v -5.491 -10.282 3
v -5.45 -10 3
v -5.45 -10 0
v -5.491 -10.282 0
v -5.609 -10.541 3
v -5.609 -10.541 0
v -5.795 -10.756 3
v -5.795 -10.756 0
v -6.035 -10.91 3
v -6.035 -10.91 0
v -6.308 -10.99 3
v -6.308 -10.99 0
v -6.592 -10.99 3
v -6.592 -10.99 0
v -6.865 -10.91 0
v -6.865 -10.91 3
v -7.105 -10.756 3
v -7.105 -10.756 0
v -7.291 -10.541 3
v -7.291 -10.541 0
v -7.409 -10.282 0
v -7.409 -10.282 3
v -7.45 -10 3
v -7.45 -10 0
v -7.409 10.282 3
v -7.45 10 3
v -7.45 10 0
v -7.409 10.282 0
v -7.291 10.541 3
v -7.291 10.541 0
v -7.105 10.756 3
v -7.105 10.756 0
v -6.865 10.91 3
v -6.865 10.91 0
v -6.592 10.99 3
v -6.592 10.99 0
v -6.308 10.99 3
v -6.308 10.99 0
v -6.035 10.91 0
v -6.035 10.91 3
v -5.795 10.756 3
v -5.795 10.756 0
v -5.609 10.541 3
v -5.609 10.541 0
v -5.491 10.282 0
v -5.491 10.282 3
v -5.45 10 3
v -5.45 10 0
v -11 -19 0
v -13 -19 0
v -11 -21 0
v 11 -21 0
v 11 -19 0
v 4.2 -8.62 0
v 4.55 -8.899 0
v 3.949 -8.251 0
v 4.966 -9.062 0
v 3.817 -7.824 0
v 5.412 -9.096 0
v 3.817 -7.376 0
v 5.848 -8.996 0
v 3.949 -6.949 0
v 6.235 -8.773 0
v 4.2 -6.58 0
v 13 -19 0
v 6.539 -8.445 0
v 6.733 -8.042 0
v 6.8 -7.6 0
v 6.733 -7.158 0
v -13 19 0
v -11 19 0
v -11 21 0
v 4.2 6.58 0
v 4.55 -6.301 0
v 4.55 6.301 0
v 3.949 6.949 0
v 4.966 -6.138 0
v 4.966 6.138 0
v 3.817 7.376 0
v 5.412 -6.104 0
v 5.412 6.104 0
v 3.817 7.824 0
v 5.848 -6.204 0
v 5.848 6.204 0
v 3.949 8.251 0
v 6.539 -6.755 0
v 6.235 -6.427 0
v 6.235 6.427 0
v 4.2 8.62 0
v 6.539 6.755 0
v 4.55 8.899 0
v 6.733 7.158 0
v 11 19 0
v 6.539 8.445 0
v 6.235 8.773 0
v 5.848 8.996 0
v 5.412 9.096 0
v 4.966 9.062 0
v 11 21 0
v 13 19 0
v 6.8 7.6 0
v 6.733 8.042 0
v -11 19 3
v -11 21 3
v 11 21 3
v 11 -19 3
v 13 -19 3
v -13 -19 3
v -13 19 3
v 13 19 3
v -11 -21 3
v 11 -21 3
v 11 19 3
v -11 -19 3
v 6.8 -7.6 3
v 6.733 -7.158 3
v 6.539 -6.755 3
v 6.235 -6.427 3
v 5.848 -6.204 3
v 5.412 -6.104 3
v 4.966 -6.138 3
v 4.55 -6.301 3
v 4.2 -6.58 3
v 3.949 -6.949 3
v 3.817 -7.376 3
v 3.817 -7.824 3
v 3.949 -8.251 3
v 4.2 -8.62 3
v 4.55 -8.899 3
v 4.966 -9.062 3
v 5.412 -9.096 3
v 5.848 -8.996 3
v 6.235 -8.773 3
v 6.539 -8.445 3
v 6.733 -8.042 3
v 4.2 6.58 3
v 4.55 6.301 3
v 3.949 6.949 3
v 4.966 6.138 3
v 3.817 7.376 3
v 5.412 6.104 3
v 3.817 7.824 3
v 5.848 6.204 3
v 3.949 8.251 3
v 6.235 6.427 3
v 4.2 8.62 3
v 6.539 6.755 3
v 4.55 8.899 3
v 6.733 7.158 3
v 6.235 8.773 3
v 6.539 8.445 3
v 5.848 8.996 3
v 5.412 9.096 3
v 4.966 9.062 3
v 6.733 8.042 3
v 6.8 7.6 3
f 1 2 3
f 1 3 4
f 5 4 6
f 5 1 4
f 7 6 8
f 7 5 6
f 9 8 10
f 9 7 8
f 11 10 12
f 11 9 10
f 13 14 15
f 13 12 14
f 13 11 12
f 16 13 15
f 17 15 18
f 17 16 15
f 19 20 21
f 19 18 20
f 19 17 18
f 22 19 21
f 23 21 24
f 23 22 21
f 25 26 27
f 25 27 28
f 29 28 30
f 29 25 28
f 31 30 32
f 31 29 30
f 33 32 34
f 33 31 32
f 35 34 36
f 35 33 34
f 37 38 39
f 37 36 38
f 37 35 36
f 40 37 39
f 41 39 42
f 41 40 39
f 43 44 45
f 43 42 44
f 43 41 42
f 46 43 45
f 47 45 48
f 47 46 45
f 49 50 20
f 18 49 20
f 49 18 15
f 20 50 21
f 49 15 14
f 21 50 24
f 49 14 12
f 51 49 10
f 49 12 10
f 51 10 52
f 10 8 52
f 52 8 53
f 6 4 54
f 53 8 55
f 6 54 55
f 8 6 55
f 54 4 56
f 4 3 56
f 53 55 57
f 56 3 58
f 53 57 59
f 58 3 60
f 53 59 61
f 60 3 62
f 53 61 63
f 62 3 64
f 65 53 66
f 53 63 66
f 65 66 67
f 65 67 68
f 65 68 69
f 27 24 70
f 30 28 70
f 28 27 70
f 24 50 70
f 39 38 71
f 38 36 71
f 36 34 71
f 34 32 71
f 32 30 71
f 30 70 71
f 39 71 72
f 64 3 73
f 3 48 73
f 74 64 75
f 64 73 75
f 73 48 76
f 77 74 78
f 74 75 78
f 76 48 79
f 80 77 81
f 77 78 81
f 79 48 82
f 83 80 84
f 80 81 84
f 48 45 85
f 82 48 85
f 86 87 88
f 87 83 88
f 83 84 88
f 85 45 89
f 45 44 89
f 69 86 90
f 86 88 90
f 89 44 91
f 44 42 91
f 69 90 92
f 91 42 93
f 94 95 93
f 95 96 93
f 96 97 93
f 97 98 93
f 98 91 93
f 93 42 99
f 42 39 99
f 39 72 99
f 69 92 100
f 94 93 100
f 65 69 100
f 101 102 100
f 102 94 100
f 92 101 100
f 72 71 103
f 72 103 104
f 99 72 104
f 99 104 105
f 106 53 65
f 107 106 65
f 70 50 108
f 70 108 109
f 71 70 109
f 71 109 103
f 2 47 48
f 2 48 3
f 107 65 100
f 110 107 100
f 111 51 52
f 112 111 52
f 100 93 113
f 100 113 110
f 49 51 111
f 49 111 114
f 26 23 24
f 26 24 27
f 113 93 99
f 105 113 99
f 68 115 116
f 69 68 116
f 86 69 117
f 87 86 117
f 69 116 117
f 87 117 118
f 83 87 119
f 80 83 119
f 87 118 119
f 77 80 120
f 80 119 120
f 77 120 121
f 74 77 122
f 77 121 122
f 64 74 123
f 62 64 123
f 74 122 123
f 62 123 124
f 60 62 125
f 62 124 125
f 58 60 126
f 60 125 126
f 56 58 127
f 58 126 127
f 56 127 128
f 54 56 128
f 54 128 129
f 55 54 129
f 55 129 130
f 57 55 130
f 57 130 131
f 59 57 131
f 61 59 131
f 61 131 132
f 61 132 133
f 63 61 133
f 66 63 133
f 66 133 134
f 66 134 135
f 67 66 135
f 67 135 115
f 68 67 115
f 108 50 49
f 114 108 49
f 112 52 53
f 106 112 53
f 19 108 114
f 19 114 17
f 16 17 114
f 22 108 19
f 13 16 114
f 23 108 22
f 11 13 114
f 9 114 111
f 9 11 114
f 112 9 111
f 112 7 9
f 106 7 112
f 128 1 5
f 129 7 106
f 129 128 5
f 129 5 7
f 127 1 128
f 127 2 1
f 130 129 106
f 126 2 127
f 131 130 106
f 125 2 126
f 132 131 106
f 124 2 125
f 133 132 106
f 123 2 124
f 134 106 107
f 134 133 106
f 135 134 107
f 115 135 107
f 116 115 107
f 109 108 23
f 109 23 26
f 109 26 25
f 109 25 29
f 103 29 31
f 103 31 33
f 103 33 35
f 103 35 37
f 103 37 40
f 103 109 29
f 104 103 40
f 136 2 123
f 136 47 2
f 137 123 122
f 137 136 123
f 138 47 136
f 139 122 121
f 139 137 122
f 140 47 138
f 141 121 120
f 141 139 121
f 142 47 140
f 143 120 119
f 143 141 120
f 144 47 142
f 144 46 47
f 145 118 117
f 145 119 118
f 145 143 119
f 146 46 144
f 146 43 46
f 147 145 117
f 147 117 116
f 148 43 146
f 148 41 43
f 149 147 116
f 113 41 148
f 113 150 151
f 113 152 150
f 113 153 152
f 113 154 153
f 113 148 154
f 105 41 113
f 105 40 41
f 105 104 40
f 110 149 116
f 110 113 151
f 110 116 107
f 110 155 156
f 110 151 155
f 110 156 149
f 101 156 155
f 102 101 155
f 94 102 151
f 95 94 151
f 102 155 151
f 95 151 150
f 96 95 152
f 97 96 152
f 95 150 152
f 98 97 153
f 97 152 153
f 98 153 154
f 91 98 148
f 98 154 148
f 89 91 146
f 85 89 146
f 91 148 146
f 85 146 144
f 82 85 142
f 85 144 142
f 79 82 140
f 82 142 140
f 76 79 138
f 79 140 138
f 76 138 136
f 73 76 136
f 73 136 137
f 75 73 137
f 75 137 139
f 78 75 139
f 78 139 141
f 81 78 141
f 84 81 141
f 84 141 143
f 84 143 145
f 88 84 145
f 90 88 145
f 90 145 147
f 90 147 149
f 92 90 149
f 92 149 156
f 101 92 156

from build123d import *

# Parameters (mm, degrees)
SKETCH_1_W          = 22
SKETCH_1_H          = 42
SKETCH_1_W_2        = 2
SKETCH_1_H_2        = 38
EXTRUDE_1_DEPTH     = 3
SKETCH_2_R          = 1.5
CUT_EXTRUDE_1_DEPTH = 10


with BuildPart() as part:
    # 草图1 → 凸台-拉伸1 (new body)
    with BuildSketch(Plane.XY):
        Rectangle(SKETCH_1_W, SKETCH_1_H)
        with Locations((-12, 0)):
            Rectangle(SKETCH_1_W_2, SKETCH_1_H_2)
        with Locations((12, 0)):
            Rectangle(SKETCH_1_W_2, SKETCH_1_H_2)
    extrude(amount=EXTRUDE_1_DEPTH)

    # 草图2 → 切除-拉伸1 (cut)
    with BuildSketch(Plane.XY.offset(3)):
        with Locations((5.3, -7.6)):
            Circle(SKETCH_2_R)
        with Locations((5.3, 7.6)):
            Circle(SKETCH_2_R)
        with BuildLine():
            Line((-7.45, -10), (-7.45, 10))
            ThreePointArc((-7.45, 10), (-6.45, 11), (-5.45, 10))
            Line((-5.45, 10), (-5.45, -10))
            ThreePointArc((-5.45, -10), (-6.45, -11), (-7.45, -10))
        make_face()
    extrude(amount=-CUT_EXTRUDE_1_DEPTH, mode=Mode.SUBTRACT)


solid = part.part
